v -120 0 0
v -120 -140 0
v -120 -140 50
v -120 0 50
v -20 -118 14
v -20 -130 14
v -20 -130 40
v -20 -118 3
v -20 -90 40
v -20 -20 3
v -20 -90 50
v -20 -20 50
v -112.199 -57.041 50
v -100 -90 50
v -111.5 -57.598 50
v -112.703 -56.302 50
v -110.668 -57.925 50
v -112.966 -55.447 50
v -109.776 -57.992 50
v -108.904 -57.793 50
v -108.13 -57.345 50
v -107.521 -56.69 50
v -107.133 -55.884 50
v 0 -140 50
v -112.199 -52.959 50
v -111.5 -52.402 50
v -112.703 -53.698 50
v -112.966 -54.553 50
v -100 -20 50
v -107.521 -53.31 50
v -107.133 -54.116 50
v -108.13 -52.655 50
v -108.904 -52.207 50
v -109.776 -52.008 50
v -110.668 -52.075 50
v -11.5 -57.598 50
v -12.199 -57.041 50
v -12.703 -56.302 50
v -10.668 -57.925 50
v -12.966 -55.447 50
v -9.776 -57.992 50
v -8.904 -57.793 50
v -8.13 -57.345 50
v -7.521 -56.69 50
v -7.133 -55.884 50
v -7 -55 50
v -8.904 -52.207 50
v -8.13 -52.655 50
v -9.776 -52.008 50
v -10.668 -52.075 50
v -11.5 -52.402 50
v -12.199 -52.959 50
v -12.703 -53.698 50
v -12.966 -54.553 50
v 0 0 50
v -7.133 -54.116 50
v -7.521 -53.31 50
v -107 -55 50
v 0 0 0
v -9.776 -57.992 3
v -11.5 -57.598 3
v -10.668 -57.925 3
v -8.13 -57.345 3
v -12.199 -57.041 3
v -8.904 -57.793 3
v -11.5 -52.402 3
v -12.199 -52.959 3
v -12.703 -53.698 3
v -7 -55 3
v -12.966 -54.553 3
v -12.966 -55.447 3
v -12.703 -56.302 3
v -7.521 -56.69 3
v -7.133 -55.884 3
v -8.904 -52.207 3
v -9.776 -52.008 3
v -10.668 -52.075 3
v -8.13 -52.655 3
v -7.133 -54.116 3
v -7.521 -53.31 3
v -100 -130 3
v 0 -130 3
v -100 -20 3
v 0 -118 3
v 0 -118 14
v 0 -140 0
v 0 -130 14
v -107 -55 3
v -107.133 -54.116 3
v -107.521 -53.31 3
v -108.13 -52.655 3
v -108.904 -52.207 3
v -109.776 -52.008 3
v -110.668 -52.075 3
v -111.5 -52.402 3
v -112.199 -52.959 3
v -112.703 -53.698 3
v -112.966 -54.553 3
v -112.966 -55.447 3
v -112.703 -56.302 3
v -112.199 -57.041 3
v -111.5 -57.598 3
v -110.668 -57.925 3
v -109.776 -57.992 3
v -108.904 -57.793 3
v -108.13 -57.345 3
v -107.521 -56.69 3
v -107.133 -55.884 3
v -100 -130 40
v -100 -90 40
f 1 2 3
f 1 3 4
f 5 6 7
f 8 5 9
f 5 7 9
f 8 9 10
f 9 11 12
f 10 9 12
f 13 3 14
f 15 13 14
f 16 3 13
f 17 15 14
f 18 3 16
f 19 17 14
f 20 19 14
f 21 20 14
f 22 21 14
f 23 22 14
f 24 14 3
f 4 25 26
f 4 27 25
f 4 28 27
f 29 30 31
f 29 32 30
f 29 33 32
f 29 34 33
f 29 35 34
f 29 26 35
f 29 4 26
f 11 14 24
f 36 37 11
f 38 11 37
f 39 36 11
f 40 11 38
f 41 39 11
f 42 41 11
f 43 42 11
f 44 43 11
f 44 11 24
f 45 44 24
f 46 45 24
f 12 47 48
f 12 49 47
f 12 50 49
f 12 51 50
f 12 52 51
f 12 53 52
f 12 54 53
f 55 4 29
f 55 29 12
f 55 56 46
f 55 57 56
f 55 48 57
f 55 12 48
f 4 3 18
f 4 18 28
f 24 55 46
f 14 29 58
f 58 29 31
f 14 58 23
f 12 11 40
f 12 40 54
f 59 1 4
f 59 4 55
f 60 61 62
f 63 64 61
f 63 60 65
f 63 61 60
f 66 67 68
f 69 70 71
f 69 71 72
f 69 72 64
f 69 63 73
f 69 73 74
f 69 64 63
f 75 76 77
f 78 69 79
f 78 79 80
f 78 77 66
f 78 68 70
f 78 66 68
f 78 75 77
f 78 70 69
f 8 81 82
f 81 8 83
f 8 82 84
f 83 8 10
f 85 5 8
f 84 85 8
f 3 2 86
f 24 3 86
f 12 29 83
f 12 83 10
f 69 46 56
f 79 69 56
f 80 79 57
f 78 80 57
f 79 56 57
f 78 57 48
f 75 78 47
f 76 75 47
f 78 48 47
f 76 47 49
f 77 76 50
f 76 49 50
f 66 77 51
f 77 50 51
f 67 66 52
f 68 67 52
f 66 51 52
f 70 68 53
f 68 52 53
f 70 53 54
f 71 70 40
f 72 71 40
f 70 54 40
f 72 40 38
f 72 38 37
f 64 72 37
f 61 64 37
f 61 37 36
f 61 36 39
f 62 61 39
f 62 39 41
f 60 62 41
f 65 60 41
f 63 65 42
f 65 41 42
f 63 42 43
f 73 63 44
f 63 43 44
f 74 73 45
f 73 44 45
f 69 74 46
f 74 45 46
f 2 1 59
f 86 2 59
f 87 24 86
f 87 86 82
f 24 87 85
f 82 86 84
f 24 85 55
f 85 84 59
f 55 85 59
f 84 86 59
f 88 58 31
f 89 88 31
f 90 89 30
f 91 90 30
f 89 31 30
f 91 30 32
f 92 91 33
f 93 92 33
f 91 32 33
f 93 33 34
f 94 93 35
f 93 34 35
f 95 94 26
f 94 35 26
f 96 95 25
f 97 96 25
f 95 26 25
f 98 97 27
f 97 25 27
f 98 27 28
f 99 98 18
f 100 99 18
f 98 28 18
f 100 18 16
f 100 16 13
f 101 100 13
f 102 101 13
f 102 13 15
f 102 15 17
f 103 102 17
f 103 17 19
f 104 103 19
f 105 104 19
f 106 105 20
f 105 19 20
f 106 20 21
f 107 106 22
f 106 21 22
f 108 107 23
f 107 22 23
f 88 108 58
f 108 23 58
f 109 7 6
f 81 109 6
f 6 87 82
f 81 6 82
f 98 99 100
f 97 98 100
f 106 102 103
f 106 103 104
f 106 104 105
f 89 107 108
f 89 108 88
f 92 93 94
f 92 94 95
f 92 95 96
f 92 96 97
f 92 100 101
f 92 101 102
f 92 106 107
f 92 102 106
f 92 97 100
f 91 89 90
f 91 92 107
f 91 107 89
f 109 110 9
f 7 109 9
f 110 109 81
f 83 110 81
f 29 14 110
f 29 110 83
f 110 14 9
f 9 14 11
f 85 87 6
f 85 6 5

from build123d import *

# Parameters (mm, degrees)
SKETCH2_W           = 120
SKETCH2_H           = 140
BOSS_EXTRUDE1_DEPTH = 50
SKETCH3_R           = 3
SKETCH3_W           = 80
SKETCH3_H           = 70
CUT_EXTRUDE1_DEPTH  = 47
CUT_EXTRUDE3_START  = -10
SKETCH4_W           = 80
SKETCH4_H           = 40
CUT_EXTRUDE3_DEPTH  = 37
SKETCH5_W           = 11
SKETCH5_H           = 12
CUT_EXTRUDE4_DEPTH  = 20


with BuildPart() as part:
    # Sketch2 → Boss-Extrude1 (new body)
    with BuildSketch(Plane.XY):
        with Locations((-60, -70)):
            Rectangle(SKETCH2_W, SKETCH2_H)
    extrude(amount=BOSS_EXTRUDE1_DEPTH)

    # Sketch3 → Cut-Extrude1 (cut)
    with BuildSketch(Plane.XY.offset(50)):
        with Locations((-110, -55)):
            Circle(SKETCH3_R)
        with Locations((-10, -55)):
            Circle(SKETCH3_R)
        with Locations((-60, -55)):
            Rectangle(SKETCH3_W, SKETCH3_H)
    extrude(amount=-CUT_EXTRUDE1_DEPTH, mode=Mode.SUBTRACT)

    # Sketch4 → Cut-Extrude3 (cut)
    with BuildSketch(Plane.XY.offset(50).offset(CUT_EXTRUDE3_START)):
        with Locations((-60, -110)):
            Rectangle(SKETCH4_W, SKETCH4_H)
    extrude(amount=-CUT_EXTRUDE3_DEPTH, mode=Mode.SUBTRACT)

    # Sketch5 → Cut-Extrude4 (cut)
    with BuildSketch(Plane(origin=(0, 0, 0), x_dir=(0, 0, -1), z_dir=(1, 0, 0))):
        with Locations((-8.5, -124)):
            Rectangle(SKETCH5_W, SKETCH5_H)
    extrude(amount=-CUT_EXTRUDE4_DEPTH, mode=Mode.SUBTRACT)


solid = part.part
